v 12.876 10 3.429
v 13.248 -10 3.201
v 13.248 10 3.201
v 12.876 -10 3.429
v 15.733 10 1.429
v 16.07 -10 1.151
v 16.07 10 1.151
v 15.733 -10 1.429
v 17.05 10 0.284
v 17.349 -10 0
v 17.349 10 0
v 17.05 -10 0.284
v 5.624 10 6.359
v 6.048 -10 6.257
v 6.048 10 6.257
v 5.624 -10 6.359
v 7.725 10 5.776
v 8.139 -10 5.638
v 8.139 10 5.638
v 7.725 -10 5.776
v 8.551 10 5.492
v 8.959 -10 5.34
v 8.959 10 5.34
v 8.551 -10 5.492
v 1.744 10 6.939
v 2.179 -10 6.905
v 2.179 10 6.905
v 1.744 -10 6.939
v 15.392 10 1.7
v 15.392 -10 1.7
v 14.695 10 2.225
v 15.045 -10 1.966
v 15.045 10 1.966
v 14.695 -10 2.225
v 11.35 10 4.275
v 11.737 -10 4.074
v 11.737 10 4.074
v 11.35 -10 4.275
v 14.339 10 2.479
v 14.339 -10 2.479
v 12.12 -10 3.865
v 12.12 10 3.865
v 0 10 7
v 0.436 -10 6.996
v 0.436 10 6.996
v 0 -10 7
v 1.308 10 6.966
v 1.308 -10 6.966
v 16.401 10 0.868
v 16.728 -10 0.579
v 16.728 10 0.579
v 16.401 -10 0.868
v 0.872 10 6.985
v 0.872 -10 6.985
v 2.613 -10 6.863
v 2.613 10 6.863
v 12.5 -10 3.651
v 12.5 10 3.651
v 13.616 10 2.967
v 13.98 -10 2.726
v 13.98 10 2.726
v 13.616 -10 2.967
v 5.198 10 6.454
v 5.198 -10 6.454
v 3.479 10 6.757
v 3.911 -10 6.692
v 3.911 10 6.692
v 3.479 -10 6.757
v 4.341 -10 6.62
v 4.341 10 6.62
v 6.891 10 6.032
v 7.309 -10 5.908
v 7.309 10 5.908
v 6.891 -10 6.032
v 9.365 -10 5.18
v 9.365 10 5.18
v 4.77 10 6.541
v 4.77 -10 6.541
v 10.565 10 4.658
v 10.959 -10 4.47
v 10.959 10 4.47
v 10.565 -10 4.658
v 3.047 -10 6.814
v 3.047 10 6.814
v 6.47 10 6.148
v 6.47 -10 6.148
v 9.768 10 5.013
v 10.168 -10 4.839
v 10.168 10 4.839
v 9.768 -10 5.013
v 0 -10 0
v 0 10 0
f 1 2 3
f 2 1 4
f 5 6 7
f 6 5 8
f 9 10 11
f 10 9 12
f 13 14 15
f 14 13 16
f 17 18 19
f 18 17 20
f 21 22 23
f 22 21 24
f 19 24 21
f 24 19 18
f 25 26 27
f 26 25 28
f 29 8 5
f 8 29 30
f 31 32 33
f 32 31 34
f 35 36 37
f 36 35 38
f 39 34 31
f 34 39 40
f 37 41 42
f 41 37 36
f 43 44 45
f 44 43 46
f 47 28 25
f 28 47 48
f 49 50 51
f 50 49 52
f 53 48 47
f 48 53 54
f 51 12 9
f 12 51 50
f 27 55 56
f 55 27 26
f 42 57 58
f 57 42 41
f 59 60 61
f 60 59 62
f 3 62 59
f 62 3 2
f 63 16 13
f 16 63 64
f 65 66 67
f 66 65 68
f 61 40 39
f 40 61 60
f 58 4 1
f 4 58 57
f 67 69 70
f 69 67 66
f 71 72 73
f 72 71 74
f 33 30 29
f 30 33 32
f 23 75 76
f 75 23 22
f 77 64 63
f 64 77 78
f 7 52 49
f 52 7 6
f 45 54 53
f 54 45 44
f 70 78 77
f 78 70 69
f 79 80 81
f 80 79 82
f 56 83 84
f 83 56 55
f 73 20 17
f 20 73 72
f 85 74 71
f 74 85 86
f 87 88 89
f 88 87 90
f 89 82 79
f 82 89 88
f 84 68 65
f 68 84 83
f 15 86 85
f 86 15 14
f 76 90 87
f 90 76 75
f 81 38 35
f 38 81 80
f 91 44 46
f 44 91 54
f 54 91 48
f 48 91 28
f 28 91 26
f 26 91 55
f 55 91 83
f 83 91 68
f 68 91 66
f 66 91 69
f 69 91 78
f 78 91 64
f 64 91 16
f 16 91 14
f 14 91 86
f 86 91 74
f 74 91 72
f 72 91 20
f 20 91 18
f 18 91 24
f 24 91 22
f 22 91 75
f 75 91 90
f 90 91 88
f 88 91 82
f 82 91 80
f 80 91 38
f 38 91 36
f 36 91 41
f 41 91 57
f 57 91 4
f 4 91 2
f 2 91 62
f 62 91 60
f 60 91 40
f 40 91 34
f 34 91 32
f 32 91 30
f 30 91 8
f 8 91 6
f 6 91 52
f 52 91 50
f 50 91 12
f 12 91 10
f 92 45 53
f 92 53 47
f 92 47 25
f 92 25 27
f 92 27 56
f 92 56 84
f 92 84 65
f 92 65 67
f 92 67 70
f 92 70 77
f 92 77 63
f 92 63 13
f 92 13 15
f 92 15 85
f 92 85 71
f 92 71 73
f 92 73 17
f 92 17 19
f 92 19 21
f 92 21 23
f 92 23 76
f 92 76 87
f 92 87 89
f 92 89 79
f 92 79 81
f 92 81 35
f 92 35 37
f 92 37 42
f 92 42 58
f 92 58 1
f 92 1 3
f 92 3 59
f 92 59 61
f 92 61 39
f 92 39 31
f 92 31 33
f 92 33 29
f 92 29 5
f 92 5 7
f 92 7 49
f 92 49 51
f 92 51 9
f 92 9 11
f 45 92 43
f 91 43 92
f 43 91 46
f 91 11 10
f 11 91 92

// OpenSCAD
include <BOSL/constants.scad>
use <BOSL/transforms.scad>
use <BOSL/shapes.scad>

$fa = 1;
$fs = 0.2;


r = 25;
height = 20;

module hcyl(decrease=0, half=true) {

    difference() {
        down(decrease) cyl(r=r, h=height, orient=ORIENT_Y);
        if (half) cuboid([500,500,500], align=[-1,0,0]);
        cuboid([500,500,500], align=[0,0,-1]);
    }
}

hcyl(18);

//down(r-height) difference() {
//    sphere(r=r);
//    up(r-height) cuboid([r*2, r*2, r*3], align=[0,0,-1]);
//}   
